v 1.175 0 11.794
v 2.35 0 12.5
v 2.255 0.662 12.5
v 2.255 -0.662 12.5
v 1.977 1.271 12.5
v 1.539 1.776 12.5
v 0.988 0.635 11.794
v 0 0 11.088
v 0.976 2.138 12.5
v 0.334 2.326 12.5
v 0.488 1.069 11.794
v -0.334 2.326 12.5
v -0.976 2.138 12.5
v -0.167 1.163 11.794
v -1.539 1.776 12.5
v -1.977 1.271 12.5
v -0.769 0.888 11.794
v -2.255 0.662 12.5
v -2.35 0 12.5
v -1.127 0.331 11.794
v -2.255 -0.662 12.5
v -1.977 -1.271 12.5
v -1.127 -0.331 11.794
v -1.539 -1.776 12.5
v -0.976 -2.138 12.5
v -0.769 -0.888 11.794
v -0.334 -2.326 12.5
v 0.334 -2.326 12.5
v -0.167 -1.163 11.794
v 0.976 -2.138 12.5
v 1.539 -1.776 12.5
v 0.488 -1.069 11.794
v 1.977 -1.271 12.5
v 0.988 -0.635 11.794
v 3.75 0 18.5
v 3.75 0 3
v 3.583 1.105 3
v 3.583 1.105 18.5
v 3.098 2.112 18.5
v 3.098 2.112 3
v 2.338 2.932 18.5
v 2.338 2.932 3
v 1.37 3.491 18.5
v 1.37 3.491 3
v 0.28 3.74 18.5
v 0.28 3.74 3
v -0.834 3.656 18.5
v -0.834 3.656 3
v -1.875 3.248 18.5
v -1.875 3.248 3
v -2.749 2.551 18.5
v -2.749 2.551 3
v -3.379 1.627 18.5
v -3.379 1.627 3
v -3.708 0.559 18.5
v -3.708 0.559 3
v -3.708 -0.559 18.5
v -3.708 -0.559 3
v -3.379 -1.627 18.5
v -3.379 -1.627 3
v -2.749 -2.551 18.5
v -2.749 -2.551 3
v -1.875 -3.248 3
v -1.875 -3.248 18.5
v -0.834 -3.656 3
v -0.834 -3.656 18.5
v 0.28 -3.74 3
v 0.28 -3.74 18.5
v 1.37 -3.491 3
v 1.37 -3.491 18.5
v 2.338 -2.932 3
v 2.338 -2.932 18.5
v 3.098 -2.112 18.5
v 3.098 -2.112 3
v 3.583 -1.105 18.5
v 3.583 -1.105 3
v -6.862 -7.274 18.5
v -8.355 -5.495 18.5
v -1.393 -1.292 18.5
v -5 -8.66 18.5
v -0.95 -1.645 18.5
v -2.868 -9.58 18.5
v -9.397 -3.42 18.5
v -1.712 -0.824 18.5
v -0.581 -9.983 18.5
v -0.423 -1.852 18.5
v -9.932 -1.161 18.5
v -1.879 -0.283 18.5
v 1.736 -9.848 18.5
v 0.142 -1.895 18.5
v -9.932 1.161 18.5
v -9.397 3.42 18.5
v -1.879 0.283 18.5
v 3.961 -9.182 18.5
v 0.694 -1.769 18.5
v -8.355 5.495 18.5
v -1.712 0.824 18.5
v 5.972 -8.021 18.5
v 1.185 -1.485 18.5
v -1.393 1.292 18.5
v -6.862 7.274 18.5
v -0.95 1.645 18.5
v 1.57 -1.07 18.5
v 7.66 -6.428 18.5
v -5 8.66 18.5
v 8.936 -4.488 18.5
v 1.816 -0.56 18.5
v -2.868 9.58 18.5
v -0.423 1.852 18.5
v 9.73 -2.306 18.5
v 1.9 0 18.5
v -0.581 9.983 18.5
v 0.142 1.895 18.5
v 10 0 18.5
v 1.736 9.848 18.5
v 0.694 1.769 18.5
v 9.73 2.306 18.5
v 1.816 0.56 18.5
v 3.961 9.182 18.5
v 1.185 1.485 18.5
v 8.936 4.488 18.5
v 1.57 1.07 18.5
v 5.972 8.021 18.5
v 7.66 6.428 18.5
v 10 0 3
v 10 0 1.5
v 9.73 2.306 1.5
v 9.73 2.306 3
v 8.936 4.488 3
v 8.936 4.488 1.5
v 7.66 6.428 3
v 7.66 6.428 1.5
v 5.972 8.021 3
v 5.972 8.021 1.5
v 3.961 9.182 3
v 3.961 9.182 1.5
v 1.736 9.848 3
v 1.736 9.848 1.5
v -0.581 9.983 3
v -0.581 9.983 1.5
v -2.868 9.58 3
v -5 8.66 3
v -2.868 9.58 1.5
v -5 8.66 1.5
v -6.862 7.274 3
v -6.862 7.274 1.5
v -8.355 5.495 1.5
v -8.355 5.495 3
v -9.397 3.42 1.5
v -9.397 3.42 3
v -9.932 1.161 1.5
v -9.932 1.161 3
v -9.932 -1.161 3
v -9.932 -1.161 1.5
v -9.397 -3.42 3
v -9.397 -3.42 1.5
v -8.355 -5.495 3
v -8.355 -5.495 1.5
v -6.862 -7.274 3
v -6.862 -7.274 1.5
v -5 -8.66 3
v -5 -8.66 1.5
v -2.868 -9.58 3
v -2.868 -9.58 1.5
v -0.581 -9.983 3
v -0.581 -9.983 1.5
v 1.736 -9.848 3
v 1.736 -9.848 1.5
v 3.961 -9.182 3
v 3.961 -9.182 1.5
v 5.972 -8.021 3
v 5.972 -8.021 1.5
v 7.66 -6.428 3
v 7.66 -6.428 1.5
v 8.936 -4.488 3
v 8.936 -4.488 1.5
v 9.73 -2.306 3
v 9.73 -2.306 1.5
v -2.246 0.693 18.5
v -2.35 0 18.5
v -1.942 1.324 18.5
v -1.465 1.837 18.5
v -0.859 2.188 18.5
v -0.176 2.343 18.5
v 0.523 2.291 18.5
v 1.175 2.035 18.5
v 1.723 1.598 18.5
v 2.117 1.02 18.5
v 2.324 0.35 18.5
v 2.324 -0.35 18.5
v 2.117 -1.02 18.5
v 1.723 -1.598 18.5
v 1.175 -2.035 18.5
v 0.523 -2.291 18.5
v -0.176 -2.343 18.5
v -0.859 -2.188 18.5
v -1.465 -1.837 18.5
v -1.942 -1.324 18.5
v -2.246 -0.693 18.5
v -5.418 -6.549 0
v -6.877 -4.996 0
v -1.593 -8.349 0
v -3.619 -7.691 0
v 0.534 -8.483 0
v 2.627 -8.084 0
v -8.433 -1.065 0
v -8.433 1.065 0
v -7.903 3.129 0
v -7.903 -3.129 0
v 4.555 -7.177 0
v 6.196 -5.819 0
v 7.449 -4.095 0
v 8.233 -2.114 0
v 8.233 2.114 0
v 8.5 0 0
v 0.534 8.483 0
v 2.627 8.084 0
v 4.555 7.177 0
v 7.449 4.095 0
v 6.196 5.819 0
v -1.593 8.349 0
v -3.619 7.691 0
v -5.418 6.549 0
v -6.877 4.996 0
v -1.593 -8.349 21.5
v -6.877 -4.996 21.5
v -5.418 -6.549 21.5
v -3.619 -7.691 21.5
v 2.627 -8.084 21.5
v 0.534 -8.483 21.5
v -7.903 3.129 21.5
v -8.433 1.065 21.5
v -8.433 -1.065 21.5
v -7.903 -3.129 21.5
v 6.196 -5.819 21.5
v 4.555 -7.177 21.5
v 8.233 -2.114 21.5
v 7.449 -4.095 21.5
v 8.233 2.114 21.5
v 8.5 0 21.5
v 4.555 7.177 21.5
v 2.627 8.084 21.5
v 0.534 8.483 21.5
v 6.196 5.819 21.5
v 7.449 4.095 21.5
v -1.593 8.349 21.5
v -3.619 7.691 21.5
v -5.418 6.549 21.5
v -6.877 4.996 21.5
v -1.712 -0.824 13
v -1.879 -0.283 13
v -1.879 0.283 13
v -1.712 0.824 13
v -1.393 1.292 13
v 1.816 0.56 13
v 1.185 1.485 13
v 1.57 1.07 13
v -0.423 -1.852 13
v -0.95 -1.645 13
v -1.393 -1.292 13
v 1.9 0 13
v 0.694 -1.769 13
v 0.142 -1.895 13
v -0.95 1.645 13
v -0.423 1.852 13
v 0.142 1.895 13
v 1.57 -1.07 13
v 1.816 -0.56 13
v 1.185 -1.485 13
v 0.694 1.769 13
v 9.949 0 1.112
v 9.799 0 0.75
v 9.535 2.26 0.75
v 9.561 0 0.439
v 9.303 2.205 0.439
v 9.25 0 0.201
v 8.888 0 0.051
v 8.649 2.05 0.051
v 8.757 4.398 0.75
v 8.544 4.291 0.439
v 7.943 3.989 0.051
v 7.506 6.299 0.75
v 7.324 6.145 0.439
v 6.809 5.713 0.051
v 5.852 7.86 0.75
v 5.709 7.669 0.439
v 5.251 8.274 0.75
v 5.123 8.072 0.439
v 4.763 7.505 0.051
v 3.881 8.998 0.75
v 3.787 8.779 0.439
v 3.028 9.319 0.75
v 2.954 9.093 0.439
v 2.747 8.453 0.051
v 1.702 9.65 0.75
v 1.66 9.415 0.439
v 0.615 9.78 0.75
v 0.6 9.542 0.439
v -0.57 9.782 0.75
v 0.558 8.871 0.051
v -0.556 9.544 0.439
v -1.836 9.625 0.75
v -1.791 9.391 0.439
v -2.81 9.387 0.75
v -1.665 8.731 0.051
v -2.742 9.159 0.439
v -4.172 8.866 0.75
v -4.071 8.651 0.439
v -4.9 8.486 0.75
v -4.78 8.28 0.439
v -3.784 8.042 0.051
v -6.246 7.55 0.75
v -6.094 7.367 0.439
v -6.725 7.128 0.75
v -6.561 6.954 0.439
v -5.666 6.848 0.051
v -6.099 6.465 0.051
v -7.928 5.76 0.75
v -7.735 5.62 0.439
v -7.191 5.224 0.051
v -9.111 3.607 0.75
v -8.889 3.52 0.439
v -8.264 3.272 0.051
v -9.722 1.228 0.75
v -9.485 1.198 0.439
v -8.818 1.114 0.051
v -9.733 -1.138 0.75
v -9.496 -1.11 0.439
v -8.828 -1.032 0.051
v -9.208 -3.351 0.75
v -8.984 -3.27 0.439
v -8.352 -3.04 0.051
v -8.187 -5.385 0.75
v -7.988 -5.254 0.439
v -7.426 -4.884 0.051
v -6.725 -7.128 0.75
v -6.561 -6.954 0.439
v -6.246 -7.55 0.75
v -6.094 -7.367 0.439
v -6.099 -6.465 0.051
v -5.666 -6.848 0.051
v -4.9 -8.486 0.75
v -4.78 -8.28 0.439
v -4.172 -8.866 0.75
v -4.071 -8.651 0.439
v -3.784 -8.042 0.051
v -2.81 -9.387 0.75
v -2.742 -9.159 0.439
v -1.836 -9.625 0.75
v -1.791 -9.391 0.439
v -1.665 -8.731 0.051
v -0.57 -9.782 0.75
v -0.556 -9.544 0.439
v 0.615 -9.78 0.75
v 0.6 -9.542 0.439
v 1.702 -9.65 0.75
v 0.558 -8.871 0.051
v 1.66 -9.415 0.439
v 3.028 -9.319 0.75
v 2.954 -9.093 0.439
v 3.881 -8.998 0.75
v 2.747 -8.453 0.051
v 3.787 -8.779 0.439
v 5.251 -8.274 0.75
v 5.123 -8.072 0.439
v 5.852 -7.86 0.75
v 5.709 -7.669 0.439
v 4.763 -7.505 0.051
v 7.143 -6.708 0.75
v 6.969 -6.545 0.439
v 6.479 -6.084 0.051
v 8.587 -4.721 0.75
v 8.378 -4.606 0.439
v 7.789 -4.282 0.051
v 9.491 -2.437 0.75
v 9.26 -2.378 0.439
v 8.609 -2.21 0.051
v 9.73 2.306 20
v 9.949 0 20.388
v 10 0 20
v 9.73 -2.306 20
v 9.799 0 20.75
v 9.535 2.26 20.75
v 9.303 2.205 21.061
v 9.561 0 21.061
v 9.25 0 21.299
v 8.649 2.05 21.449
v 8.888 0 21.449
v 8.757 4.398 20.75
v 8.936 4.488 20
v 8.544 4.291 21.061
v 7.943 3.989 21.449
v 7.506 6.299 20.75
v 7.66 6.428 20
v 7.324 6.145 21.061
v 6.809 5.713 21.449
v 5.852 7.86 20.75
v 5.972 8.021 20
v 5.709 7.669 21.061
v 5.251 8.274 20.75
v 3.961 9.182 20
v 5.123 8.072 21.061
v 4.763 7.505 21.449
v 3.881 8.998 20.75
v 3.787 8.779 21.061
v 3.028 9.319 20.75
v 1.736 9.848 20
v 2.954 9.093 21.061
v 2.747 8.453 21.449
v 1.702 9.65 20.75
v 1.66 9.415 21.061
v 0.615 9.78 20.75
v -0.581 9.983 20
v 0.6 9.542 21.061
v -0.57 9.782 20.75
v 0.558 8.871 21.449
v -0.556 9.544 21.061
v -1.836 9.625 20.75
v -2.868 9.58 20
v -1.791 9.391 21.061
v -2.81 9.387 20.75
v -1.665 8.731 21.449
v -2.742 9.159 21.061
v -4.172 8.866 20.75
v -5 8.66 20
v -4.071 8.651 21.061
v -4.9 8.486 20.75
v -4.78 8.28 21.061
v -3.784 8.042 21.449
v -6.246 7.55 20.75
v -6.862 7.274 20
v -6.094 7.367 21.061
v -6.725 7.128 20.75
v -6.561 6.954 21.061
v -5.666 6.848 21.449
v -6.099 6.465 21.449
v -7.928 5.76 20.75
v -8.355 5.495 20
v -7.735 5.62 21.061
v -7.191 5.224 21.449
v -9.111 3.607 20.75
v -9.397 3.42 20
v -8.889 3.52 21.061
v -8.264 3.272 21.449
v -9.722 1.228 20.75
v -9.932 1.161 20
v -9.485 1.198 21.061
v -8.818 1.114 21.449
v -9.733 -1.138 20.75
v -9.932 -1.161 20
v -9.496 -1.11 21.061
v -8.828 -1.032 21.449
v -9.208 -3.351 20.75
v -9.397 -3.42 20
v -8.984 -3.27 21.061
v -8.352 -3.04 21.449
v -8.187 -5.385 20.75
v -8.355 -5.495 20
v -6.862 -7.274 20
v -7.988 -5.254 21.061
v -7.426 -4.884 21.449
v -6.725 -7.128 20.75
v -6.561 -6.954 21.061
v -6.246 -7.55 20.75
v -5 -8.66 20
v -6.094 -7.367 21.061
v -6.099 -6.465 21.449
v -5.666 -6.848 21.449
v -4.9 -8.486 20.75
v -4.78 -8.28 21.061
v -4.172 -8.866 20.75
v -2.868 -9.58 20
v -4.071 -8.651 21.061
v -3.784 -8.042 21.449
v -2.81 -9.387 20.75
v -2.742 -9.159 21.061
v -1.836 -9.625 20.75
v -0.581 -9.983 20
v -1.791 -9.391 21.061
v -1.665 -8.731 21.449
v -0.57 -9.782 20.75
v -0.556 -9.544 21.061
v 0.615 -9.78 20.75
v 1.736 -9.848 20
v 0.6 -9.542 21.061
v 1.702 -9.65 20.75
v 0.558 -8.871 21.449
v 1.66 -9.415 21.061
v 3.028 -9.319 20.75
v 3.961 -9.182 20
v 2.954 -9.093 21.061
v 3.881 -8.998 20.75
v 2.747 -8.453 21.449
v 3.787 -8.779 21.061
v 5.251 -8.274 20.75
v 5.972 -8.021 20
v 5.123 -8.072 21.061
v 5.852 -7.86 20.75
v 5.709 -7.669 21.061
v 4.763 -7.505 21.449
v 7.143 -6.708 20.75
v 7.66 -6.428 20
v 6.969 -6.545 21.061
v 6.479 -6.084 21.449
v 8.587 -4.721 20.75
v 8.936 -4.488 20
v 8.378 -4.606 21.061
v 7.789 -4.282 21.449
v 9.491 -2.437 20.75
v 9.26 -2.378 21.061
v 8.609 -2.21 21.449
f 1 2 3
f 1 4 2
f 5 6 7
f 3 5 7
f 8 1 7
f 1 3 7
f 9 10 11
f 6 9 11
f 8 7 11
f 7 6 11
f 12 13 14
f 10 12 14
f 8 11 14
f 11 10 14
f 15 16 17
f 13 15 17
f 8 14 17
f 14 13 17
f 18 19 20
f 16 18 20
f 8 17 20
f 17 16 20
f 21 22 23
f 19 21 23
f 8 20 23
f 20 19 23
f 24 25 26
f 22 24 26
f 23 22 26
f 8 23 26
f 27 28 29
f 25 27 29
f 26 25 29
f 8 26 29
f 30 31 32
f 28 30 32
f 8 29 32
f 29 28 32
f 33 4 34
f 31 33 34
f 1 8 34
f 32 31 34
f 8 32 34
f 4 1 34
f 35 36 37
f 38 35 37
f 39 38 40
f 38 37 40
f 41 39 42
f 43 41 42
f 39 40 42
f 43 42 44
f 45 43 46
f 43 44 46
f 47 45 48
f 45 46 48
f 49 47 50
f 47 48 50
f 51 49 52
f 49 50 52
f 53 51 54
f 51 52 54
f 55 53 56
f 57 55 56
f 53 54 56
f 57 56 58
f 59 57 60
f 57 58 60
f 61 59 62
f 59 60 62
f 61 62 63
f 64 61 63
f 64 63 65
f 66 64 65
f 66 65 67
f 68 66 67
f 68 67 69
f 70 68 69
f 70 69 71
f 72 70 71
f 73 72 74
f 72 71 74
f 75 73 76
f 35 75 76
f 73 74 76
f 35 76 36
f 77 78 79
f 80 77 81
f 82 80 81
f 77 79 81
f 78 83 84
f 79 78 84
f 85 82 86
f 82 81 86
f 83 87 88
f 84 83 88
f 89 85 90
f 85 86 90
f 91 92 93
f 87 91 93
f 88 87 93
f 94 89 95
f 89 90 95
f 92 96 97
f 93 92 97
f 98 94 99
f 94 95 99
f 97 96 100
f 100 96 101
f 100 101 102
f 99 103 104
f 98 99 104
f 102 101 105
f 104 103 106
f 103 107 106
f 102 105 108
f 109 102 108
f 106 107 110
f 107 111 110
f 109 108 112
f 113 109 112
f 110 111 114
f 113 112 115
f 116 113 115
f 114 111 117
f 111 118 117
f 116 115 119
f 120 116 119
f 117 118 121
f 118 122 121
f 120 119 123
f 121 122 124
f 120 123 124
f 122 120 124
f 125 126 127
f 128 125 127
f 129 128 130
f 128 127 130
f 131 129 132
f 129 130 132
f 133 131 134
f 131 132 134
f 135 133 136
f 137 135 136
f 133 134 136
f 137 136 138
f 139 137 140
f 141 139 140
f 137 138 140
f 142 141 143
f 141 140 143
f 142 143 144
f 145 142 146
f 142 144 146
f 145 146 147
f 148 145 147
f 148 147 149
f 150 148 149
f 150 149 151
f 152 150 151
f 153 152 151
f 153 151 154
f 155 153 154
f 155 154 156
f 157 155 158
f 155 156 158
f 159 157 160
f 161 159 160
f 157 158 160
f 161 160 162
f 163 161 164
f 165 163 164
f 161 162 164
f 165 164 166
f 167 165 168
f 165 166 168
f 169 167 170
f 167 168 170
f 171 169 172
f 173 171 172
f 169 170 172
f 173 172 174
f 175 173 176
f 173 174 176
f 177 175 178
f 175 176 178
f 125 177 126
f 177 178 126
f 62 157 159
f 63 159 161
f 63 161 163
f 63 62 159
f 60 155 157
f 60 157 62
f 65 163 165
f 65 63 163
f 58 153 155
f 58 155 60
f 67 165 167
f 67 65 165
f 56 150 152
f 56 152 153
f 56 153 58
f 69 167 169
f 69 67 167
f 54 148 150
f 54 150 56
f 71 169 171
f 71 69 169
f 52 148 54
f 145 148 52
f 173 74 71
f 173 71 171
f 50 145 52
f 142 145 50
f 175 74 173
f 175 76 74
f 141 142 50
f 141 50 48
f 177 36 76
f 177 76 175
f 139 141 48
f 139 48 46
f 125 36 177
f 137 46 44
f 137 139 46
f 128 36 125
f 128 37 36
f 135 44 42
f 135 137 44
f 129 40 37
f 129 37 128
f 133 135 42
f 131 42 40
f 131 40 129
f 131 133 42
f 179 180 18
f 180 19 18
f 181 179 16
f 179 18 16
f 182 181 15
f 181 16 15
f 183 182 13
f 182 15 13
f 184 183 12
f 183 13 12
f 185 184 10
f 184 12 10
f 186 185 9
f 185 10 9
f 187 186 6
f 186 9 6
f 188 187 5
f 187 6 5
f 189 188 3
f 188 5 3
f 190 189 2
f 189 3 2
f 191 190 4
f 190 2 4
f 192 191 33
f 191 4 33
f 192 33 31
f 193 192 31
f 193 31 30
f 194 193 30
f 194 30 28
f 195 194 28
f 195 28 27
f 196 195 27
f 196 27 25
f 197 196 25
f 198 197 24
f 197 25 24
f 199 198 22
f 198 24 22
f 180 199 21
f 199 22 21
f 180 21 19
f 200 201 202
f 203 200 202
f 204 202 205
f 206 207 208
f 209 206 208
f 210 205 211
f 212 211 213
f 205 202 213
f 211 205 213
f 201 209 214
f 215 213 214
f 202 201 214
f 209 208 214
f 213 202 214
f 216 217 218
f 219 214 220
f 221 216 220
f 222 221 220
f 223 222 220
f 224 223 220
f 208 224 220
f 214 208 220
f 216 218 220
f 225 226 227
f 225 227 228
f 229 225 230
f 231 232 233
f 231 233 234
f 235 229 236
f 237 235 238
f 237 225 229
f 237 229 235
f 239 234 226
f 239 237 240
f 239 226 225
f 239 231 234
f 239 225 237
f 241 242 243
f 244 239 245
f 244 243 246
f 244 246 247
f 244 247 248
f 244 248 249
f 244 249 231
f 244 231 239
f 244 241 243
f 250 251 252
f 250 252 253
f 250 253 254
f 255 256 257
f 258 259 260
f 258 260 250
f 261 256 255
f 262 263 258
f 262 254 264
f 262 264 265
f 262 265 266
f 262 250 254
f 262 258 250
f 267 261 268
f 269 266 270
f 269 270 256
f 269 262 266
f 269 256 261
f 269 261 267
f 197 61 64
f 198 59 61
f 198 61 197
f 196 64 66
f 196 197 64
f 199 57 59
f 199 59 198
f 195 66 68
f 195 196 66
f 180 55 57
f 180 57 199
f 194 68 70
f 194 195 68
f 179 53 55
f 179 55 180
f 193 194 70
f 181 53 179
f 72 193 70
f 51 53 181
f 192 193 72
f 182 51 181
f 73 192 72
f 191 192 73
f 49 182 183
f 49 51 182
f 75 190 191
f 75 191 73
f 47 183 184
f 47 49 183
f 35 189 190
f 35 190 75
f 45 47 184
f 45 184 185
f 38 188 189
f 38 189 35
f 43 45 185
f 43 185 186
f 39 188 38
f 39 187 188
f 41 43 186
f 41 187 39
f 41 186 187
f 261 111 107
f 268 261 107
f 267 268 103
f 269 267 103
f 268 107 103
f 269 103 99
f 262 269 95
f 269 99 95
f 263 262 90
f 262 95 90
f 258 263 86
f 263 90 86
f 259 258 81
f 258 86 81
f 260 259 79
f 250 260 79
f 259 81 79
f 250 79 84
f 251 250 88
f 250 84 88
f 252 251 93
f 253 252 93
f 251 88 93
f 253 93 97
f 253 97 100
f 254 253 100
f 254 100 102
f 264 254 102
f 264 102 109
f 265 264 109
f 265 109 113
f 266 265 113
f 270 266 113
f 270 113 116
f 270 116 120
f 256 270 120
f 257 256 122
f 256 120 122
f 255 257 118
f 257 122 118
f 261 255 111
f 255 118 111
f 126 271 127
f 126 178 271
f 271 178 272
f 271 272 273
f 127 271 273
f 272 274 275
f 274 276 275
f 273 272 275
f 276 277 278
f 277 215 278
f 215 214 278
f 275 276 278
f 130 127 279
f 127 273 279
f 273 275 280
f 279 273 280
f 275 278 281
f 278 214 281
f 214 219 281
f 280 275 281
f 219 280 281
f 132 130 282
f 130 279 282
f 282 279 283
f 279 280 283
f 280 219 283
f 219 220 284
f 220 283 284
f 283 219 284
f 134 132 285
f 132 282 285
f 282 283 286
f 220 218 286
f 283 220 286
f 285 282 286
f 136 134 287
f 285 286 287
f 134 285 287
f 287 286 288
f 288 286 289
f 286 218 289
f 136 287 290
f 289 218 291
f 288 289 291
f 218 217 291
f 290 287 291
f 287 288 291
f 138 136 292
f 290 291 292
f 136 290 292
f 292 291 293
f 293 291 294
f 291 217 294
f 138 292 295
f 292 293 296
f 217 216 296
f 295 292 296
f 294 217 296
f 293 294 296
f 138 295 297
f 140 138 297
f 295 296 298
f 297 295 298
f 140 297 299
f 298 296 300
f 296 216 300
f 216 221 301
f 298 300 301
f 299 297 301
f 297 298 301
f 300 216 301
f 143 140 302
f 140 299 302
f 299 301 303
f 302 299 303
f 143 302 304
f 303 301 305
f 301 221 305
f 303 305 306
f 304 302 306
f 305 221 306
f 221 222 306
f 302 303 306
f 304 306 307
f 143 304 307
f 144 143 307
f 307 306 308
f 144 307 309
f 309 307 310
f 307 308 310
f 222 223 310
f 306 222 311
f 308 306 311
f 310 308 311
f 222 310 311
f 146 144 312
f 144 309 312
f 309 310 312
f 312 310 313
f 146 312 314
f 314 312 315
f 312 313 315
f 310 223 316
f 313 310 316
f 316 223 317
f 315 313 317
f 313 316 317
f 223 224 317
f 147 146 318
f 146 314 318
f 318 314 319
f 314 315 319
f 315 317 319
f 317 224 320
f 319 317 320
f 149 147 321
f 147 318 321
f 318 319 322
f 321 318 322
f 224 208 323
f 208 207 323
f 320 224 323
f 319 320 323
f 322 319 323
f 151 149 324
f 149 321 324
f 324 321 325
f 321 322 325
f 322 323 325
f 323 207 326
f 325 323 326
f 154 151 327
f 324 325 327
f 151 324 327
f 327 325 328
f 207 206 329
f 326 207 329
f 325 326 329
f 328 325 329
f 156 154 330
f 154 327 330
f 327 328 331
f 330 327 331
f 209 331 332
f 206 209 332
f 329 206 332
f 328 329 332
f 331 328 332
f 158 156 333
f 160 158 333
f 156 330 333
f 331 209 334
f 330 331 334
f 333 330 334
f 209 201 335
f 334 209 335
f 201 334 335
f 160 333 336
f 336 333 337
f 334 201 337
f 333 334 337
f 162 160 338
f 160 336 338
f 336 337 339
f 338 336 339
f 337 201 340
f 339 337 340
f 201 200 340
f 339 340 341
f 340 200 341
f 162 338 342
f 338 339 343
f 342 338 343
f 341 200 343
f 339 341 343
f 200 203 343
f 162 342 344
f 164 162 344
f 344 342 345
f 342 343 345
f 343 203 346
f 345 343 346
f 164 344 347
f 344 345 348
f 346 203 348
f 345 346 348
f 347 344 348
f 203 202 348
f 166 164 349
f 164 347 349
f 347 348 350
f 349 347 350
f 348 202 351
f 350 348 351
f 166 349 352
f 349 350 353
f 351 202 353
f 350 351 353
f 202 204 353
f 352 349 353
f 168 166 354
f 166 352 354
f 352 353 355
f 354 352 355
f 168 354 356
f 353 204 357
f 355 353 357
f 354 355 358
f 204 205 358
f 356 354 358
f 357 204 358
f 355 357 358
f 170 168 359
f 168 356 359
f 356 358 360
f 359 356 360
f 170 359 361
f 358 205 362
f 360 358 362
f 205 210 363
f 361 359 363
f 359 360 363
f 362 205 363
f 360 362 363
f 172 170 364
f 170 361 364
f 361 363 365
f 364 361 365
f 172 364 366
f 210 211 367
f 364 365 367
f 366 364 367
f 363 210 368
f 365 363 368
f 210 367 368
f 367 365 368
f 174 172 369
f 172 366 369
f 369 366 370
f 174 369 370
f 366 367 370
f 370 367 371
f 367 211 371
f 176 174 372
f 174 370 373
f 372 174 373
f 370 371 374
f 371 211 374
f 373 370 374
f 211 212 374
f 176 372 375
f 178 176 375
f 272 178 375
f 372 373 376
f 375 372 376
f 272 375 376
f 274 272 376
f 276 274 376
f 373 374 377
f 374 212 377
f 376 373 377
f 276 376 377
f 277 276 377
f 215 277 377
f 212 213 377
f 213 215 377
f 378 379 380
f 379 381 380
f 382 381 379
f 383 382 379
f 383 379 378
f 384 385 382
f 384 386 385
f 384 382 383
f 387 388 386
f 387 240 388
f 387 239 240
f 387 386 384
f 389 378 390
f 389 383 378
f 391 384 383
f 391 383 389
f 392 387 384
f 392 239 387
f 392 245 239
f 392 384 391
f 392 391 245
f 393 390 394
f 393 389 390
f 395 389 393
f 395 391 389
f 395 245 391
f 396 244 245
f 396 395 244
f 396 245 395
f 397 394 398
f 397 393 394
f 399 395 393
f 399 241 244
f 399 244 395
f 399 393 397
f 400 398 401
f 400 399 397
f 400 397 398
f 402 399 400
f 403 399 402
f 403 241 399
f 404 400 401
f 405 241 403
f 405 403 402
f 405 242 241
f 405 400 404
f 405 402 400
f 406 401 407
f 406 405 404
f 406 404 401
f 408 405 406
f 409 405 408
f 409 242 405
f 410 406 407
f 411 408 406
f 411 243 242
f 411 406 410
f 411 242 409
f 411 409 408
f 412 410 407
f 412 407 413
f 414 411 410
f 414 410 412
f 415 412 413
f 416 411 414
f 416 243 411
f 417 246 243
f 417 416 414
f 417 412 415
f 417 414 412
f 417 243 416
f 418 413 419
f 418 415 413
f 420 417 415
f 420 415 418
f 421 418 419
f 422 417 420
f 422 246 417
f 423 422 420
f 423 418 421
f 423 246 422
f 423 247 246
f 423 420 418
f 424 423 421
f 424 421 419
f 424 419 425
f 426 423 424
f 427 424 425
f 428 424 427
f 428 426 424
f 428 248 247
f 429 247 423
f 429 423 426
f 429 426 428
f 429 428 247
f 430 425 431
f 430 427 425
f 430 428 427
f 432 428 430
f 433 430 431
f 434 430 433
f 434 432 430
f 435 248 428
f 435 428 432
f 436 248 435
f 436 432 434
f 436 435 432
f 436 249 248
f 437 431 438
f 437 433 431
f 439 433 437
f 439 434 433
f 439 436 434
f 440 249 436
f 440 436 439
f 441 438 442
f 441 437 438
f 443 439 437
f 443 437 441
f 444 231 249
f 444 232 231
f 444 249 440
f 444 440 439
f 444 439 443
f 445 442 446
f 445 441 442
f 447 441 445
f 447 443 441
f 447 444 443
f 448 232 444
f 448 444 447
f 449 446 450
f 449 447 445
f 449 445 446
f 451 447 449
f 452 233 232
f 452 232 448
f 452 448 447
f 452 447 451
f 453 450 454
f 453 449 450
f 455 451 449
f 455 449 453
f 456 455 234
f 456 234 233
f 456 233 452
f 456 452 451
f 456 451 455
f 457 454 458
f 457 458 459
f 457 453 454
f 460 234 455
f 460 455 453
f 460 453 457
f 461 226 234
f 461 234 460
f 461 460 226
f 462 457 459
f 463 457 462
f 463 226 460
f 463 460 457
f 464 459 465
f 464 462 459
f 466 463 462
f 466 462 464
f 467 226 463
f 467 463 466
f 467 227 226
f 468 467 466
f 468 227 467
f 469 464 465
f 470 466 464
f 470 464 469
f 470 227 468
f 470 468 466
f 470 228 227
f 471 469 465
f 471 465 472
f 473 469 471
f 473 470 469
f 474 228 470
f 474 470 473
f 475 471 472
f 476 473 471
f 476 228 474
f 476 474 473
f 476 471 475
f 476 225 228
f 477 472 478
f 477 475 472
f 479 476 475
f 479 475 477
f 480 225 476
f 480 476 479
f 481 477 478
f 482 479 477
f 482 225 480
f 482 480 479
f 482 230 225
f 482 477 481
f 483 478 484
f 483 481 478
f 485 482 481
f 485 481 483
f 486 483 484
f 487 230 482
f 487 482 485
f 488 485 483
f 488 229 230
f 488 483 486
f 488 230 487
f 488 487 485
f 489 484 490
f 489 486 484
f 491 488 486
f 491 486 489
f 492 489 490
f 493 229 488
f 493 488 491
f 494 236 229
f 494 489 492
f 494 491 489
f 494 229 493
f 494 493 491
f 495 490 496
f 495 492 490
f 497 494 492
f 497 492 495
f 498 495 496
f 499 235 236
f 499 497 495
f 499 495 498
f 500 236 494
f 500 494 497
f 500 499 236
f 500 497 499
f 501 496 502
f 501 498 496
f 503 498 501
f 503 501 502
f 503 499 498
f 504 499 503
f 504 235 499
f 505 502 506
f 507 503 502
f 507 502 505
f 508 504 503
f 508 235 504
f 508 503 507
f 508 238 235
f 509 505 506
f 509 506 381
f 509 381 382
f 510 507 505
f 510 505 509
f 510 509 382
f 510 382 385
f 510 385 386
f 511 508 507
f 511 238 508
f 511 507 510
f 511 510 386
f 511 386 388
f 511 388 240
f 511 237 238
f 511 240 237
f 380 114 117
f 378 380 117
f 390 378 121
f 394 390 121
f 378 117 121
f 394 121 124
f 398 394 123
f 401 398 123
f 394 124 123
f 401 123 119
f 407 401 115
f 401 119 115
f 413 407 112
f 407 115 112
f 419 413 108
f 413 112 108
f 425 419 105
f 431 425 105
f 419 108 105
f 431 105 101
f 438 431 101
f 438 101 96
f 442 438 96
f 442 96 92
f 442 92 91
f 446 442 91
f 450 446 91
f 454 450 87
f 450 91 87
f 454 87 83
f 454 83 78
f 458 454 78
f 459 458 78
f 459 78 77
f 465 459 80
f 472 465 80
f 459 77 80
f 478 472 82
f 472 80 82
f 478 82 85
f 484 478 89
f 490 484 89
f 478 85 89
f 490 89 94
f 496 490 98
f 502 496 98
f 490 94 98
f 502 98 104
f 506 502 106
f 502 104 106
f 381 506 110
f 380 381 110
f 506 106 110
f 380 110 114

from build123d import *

# Parameters (mm, degrees)
F0_R      = 10
F1_DEPTH  = 3
F2_R      = 3.75
F3_DEPTH  = 15.5
F5_D      = 4.7
F5_DEPTH  = 6
F5_TIP    = 1.4120224547
F6_R      = 1.5
F7_R      = 10
F8_DEPTH  = 3
F9_R      = 1.9
F10_DEPTH = 5.5
F11_R     = 1.5


with BuildPart() as f1:
    # F0 (on Top) → F1 (new body)
    with BuildSketch(Plane.XY):
        Circle(F0_R)
    extrude(amount=F1_DEPTH)

    # F2 (on face) → F3 (join)
    with BuildSketch(Plane.XY.offset(3)):
        Circle(F2_R)
    extrude(amount=F3_DEPTH)

    # F5
    with Locations(Plane.XY.offset(18.5)):
        with Locations((0, 0)):
            Hole(F5_D / 2, depth=F5_DEPTH)
            with Locations((0, 0, -(F5_DEPTH + F5_TIP / 2))):  # 118° drill point
                Cone(0, F5_D / 2, F5_TIP, mode=Mode.SUBTRACT)

    # F6
    f6_edges = [f1.edges().sort_by_distance(p)[0] for p in [
        (-10, 0, 0),
    ]]
    fillet(f6_edges, radius=F6_R)


with BuildPart() as f8:
    # F7 (on face) → F8 (new body)
    with BuildSketch(Plane.XY.offset(18.5)):
        Circle(F7_R)
    extrude(amount=F8_DEPTH)

    # F9 (on face) → F10 (join)
    with BuildSketch(Plane(origin=(0, 0, 18.5), x_dir=(1, 0, 0), z_dir=(0, 0, -1))):
        Circle(F9_R)
    extrude(amount=F10_DEPTH)

    # F11
    f11_edges = [f8.edges().sort_by_distance(p)[0] for p in [
        (-10, 0, 21.5),
    ]]
    fillet(f11_edges, radius=F11_R)


solid = Compound([f1.part, f8.part])
